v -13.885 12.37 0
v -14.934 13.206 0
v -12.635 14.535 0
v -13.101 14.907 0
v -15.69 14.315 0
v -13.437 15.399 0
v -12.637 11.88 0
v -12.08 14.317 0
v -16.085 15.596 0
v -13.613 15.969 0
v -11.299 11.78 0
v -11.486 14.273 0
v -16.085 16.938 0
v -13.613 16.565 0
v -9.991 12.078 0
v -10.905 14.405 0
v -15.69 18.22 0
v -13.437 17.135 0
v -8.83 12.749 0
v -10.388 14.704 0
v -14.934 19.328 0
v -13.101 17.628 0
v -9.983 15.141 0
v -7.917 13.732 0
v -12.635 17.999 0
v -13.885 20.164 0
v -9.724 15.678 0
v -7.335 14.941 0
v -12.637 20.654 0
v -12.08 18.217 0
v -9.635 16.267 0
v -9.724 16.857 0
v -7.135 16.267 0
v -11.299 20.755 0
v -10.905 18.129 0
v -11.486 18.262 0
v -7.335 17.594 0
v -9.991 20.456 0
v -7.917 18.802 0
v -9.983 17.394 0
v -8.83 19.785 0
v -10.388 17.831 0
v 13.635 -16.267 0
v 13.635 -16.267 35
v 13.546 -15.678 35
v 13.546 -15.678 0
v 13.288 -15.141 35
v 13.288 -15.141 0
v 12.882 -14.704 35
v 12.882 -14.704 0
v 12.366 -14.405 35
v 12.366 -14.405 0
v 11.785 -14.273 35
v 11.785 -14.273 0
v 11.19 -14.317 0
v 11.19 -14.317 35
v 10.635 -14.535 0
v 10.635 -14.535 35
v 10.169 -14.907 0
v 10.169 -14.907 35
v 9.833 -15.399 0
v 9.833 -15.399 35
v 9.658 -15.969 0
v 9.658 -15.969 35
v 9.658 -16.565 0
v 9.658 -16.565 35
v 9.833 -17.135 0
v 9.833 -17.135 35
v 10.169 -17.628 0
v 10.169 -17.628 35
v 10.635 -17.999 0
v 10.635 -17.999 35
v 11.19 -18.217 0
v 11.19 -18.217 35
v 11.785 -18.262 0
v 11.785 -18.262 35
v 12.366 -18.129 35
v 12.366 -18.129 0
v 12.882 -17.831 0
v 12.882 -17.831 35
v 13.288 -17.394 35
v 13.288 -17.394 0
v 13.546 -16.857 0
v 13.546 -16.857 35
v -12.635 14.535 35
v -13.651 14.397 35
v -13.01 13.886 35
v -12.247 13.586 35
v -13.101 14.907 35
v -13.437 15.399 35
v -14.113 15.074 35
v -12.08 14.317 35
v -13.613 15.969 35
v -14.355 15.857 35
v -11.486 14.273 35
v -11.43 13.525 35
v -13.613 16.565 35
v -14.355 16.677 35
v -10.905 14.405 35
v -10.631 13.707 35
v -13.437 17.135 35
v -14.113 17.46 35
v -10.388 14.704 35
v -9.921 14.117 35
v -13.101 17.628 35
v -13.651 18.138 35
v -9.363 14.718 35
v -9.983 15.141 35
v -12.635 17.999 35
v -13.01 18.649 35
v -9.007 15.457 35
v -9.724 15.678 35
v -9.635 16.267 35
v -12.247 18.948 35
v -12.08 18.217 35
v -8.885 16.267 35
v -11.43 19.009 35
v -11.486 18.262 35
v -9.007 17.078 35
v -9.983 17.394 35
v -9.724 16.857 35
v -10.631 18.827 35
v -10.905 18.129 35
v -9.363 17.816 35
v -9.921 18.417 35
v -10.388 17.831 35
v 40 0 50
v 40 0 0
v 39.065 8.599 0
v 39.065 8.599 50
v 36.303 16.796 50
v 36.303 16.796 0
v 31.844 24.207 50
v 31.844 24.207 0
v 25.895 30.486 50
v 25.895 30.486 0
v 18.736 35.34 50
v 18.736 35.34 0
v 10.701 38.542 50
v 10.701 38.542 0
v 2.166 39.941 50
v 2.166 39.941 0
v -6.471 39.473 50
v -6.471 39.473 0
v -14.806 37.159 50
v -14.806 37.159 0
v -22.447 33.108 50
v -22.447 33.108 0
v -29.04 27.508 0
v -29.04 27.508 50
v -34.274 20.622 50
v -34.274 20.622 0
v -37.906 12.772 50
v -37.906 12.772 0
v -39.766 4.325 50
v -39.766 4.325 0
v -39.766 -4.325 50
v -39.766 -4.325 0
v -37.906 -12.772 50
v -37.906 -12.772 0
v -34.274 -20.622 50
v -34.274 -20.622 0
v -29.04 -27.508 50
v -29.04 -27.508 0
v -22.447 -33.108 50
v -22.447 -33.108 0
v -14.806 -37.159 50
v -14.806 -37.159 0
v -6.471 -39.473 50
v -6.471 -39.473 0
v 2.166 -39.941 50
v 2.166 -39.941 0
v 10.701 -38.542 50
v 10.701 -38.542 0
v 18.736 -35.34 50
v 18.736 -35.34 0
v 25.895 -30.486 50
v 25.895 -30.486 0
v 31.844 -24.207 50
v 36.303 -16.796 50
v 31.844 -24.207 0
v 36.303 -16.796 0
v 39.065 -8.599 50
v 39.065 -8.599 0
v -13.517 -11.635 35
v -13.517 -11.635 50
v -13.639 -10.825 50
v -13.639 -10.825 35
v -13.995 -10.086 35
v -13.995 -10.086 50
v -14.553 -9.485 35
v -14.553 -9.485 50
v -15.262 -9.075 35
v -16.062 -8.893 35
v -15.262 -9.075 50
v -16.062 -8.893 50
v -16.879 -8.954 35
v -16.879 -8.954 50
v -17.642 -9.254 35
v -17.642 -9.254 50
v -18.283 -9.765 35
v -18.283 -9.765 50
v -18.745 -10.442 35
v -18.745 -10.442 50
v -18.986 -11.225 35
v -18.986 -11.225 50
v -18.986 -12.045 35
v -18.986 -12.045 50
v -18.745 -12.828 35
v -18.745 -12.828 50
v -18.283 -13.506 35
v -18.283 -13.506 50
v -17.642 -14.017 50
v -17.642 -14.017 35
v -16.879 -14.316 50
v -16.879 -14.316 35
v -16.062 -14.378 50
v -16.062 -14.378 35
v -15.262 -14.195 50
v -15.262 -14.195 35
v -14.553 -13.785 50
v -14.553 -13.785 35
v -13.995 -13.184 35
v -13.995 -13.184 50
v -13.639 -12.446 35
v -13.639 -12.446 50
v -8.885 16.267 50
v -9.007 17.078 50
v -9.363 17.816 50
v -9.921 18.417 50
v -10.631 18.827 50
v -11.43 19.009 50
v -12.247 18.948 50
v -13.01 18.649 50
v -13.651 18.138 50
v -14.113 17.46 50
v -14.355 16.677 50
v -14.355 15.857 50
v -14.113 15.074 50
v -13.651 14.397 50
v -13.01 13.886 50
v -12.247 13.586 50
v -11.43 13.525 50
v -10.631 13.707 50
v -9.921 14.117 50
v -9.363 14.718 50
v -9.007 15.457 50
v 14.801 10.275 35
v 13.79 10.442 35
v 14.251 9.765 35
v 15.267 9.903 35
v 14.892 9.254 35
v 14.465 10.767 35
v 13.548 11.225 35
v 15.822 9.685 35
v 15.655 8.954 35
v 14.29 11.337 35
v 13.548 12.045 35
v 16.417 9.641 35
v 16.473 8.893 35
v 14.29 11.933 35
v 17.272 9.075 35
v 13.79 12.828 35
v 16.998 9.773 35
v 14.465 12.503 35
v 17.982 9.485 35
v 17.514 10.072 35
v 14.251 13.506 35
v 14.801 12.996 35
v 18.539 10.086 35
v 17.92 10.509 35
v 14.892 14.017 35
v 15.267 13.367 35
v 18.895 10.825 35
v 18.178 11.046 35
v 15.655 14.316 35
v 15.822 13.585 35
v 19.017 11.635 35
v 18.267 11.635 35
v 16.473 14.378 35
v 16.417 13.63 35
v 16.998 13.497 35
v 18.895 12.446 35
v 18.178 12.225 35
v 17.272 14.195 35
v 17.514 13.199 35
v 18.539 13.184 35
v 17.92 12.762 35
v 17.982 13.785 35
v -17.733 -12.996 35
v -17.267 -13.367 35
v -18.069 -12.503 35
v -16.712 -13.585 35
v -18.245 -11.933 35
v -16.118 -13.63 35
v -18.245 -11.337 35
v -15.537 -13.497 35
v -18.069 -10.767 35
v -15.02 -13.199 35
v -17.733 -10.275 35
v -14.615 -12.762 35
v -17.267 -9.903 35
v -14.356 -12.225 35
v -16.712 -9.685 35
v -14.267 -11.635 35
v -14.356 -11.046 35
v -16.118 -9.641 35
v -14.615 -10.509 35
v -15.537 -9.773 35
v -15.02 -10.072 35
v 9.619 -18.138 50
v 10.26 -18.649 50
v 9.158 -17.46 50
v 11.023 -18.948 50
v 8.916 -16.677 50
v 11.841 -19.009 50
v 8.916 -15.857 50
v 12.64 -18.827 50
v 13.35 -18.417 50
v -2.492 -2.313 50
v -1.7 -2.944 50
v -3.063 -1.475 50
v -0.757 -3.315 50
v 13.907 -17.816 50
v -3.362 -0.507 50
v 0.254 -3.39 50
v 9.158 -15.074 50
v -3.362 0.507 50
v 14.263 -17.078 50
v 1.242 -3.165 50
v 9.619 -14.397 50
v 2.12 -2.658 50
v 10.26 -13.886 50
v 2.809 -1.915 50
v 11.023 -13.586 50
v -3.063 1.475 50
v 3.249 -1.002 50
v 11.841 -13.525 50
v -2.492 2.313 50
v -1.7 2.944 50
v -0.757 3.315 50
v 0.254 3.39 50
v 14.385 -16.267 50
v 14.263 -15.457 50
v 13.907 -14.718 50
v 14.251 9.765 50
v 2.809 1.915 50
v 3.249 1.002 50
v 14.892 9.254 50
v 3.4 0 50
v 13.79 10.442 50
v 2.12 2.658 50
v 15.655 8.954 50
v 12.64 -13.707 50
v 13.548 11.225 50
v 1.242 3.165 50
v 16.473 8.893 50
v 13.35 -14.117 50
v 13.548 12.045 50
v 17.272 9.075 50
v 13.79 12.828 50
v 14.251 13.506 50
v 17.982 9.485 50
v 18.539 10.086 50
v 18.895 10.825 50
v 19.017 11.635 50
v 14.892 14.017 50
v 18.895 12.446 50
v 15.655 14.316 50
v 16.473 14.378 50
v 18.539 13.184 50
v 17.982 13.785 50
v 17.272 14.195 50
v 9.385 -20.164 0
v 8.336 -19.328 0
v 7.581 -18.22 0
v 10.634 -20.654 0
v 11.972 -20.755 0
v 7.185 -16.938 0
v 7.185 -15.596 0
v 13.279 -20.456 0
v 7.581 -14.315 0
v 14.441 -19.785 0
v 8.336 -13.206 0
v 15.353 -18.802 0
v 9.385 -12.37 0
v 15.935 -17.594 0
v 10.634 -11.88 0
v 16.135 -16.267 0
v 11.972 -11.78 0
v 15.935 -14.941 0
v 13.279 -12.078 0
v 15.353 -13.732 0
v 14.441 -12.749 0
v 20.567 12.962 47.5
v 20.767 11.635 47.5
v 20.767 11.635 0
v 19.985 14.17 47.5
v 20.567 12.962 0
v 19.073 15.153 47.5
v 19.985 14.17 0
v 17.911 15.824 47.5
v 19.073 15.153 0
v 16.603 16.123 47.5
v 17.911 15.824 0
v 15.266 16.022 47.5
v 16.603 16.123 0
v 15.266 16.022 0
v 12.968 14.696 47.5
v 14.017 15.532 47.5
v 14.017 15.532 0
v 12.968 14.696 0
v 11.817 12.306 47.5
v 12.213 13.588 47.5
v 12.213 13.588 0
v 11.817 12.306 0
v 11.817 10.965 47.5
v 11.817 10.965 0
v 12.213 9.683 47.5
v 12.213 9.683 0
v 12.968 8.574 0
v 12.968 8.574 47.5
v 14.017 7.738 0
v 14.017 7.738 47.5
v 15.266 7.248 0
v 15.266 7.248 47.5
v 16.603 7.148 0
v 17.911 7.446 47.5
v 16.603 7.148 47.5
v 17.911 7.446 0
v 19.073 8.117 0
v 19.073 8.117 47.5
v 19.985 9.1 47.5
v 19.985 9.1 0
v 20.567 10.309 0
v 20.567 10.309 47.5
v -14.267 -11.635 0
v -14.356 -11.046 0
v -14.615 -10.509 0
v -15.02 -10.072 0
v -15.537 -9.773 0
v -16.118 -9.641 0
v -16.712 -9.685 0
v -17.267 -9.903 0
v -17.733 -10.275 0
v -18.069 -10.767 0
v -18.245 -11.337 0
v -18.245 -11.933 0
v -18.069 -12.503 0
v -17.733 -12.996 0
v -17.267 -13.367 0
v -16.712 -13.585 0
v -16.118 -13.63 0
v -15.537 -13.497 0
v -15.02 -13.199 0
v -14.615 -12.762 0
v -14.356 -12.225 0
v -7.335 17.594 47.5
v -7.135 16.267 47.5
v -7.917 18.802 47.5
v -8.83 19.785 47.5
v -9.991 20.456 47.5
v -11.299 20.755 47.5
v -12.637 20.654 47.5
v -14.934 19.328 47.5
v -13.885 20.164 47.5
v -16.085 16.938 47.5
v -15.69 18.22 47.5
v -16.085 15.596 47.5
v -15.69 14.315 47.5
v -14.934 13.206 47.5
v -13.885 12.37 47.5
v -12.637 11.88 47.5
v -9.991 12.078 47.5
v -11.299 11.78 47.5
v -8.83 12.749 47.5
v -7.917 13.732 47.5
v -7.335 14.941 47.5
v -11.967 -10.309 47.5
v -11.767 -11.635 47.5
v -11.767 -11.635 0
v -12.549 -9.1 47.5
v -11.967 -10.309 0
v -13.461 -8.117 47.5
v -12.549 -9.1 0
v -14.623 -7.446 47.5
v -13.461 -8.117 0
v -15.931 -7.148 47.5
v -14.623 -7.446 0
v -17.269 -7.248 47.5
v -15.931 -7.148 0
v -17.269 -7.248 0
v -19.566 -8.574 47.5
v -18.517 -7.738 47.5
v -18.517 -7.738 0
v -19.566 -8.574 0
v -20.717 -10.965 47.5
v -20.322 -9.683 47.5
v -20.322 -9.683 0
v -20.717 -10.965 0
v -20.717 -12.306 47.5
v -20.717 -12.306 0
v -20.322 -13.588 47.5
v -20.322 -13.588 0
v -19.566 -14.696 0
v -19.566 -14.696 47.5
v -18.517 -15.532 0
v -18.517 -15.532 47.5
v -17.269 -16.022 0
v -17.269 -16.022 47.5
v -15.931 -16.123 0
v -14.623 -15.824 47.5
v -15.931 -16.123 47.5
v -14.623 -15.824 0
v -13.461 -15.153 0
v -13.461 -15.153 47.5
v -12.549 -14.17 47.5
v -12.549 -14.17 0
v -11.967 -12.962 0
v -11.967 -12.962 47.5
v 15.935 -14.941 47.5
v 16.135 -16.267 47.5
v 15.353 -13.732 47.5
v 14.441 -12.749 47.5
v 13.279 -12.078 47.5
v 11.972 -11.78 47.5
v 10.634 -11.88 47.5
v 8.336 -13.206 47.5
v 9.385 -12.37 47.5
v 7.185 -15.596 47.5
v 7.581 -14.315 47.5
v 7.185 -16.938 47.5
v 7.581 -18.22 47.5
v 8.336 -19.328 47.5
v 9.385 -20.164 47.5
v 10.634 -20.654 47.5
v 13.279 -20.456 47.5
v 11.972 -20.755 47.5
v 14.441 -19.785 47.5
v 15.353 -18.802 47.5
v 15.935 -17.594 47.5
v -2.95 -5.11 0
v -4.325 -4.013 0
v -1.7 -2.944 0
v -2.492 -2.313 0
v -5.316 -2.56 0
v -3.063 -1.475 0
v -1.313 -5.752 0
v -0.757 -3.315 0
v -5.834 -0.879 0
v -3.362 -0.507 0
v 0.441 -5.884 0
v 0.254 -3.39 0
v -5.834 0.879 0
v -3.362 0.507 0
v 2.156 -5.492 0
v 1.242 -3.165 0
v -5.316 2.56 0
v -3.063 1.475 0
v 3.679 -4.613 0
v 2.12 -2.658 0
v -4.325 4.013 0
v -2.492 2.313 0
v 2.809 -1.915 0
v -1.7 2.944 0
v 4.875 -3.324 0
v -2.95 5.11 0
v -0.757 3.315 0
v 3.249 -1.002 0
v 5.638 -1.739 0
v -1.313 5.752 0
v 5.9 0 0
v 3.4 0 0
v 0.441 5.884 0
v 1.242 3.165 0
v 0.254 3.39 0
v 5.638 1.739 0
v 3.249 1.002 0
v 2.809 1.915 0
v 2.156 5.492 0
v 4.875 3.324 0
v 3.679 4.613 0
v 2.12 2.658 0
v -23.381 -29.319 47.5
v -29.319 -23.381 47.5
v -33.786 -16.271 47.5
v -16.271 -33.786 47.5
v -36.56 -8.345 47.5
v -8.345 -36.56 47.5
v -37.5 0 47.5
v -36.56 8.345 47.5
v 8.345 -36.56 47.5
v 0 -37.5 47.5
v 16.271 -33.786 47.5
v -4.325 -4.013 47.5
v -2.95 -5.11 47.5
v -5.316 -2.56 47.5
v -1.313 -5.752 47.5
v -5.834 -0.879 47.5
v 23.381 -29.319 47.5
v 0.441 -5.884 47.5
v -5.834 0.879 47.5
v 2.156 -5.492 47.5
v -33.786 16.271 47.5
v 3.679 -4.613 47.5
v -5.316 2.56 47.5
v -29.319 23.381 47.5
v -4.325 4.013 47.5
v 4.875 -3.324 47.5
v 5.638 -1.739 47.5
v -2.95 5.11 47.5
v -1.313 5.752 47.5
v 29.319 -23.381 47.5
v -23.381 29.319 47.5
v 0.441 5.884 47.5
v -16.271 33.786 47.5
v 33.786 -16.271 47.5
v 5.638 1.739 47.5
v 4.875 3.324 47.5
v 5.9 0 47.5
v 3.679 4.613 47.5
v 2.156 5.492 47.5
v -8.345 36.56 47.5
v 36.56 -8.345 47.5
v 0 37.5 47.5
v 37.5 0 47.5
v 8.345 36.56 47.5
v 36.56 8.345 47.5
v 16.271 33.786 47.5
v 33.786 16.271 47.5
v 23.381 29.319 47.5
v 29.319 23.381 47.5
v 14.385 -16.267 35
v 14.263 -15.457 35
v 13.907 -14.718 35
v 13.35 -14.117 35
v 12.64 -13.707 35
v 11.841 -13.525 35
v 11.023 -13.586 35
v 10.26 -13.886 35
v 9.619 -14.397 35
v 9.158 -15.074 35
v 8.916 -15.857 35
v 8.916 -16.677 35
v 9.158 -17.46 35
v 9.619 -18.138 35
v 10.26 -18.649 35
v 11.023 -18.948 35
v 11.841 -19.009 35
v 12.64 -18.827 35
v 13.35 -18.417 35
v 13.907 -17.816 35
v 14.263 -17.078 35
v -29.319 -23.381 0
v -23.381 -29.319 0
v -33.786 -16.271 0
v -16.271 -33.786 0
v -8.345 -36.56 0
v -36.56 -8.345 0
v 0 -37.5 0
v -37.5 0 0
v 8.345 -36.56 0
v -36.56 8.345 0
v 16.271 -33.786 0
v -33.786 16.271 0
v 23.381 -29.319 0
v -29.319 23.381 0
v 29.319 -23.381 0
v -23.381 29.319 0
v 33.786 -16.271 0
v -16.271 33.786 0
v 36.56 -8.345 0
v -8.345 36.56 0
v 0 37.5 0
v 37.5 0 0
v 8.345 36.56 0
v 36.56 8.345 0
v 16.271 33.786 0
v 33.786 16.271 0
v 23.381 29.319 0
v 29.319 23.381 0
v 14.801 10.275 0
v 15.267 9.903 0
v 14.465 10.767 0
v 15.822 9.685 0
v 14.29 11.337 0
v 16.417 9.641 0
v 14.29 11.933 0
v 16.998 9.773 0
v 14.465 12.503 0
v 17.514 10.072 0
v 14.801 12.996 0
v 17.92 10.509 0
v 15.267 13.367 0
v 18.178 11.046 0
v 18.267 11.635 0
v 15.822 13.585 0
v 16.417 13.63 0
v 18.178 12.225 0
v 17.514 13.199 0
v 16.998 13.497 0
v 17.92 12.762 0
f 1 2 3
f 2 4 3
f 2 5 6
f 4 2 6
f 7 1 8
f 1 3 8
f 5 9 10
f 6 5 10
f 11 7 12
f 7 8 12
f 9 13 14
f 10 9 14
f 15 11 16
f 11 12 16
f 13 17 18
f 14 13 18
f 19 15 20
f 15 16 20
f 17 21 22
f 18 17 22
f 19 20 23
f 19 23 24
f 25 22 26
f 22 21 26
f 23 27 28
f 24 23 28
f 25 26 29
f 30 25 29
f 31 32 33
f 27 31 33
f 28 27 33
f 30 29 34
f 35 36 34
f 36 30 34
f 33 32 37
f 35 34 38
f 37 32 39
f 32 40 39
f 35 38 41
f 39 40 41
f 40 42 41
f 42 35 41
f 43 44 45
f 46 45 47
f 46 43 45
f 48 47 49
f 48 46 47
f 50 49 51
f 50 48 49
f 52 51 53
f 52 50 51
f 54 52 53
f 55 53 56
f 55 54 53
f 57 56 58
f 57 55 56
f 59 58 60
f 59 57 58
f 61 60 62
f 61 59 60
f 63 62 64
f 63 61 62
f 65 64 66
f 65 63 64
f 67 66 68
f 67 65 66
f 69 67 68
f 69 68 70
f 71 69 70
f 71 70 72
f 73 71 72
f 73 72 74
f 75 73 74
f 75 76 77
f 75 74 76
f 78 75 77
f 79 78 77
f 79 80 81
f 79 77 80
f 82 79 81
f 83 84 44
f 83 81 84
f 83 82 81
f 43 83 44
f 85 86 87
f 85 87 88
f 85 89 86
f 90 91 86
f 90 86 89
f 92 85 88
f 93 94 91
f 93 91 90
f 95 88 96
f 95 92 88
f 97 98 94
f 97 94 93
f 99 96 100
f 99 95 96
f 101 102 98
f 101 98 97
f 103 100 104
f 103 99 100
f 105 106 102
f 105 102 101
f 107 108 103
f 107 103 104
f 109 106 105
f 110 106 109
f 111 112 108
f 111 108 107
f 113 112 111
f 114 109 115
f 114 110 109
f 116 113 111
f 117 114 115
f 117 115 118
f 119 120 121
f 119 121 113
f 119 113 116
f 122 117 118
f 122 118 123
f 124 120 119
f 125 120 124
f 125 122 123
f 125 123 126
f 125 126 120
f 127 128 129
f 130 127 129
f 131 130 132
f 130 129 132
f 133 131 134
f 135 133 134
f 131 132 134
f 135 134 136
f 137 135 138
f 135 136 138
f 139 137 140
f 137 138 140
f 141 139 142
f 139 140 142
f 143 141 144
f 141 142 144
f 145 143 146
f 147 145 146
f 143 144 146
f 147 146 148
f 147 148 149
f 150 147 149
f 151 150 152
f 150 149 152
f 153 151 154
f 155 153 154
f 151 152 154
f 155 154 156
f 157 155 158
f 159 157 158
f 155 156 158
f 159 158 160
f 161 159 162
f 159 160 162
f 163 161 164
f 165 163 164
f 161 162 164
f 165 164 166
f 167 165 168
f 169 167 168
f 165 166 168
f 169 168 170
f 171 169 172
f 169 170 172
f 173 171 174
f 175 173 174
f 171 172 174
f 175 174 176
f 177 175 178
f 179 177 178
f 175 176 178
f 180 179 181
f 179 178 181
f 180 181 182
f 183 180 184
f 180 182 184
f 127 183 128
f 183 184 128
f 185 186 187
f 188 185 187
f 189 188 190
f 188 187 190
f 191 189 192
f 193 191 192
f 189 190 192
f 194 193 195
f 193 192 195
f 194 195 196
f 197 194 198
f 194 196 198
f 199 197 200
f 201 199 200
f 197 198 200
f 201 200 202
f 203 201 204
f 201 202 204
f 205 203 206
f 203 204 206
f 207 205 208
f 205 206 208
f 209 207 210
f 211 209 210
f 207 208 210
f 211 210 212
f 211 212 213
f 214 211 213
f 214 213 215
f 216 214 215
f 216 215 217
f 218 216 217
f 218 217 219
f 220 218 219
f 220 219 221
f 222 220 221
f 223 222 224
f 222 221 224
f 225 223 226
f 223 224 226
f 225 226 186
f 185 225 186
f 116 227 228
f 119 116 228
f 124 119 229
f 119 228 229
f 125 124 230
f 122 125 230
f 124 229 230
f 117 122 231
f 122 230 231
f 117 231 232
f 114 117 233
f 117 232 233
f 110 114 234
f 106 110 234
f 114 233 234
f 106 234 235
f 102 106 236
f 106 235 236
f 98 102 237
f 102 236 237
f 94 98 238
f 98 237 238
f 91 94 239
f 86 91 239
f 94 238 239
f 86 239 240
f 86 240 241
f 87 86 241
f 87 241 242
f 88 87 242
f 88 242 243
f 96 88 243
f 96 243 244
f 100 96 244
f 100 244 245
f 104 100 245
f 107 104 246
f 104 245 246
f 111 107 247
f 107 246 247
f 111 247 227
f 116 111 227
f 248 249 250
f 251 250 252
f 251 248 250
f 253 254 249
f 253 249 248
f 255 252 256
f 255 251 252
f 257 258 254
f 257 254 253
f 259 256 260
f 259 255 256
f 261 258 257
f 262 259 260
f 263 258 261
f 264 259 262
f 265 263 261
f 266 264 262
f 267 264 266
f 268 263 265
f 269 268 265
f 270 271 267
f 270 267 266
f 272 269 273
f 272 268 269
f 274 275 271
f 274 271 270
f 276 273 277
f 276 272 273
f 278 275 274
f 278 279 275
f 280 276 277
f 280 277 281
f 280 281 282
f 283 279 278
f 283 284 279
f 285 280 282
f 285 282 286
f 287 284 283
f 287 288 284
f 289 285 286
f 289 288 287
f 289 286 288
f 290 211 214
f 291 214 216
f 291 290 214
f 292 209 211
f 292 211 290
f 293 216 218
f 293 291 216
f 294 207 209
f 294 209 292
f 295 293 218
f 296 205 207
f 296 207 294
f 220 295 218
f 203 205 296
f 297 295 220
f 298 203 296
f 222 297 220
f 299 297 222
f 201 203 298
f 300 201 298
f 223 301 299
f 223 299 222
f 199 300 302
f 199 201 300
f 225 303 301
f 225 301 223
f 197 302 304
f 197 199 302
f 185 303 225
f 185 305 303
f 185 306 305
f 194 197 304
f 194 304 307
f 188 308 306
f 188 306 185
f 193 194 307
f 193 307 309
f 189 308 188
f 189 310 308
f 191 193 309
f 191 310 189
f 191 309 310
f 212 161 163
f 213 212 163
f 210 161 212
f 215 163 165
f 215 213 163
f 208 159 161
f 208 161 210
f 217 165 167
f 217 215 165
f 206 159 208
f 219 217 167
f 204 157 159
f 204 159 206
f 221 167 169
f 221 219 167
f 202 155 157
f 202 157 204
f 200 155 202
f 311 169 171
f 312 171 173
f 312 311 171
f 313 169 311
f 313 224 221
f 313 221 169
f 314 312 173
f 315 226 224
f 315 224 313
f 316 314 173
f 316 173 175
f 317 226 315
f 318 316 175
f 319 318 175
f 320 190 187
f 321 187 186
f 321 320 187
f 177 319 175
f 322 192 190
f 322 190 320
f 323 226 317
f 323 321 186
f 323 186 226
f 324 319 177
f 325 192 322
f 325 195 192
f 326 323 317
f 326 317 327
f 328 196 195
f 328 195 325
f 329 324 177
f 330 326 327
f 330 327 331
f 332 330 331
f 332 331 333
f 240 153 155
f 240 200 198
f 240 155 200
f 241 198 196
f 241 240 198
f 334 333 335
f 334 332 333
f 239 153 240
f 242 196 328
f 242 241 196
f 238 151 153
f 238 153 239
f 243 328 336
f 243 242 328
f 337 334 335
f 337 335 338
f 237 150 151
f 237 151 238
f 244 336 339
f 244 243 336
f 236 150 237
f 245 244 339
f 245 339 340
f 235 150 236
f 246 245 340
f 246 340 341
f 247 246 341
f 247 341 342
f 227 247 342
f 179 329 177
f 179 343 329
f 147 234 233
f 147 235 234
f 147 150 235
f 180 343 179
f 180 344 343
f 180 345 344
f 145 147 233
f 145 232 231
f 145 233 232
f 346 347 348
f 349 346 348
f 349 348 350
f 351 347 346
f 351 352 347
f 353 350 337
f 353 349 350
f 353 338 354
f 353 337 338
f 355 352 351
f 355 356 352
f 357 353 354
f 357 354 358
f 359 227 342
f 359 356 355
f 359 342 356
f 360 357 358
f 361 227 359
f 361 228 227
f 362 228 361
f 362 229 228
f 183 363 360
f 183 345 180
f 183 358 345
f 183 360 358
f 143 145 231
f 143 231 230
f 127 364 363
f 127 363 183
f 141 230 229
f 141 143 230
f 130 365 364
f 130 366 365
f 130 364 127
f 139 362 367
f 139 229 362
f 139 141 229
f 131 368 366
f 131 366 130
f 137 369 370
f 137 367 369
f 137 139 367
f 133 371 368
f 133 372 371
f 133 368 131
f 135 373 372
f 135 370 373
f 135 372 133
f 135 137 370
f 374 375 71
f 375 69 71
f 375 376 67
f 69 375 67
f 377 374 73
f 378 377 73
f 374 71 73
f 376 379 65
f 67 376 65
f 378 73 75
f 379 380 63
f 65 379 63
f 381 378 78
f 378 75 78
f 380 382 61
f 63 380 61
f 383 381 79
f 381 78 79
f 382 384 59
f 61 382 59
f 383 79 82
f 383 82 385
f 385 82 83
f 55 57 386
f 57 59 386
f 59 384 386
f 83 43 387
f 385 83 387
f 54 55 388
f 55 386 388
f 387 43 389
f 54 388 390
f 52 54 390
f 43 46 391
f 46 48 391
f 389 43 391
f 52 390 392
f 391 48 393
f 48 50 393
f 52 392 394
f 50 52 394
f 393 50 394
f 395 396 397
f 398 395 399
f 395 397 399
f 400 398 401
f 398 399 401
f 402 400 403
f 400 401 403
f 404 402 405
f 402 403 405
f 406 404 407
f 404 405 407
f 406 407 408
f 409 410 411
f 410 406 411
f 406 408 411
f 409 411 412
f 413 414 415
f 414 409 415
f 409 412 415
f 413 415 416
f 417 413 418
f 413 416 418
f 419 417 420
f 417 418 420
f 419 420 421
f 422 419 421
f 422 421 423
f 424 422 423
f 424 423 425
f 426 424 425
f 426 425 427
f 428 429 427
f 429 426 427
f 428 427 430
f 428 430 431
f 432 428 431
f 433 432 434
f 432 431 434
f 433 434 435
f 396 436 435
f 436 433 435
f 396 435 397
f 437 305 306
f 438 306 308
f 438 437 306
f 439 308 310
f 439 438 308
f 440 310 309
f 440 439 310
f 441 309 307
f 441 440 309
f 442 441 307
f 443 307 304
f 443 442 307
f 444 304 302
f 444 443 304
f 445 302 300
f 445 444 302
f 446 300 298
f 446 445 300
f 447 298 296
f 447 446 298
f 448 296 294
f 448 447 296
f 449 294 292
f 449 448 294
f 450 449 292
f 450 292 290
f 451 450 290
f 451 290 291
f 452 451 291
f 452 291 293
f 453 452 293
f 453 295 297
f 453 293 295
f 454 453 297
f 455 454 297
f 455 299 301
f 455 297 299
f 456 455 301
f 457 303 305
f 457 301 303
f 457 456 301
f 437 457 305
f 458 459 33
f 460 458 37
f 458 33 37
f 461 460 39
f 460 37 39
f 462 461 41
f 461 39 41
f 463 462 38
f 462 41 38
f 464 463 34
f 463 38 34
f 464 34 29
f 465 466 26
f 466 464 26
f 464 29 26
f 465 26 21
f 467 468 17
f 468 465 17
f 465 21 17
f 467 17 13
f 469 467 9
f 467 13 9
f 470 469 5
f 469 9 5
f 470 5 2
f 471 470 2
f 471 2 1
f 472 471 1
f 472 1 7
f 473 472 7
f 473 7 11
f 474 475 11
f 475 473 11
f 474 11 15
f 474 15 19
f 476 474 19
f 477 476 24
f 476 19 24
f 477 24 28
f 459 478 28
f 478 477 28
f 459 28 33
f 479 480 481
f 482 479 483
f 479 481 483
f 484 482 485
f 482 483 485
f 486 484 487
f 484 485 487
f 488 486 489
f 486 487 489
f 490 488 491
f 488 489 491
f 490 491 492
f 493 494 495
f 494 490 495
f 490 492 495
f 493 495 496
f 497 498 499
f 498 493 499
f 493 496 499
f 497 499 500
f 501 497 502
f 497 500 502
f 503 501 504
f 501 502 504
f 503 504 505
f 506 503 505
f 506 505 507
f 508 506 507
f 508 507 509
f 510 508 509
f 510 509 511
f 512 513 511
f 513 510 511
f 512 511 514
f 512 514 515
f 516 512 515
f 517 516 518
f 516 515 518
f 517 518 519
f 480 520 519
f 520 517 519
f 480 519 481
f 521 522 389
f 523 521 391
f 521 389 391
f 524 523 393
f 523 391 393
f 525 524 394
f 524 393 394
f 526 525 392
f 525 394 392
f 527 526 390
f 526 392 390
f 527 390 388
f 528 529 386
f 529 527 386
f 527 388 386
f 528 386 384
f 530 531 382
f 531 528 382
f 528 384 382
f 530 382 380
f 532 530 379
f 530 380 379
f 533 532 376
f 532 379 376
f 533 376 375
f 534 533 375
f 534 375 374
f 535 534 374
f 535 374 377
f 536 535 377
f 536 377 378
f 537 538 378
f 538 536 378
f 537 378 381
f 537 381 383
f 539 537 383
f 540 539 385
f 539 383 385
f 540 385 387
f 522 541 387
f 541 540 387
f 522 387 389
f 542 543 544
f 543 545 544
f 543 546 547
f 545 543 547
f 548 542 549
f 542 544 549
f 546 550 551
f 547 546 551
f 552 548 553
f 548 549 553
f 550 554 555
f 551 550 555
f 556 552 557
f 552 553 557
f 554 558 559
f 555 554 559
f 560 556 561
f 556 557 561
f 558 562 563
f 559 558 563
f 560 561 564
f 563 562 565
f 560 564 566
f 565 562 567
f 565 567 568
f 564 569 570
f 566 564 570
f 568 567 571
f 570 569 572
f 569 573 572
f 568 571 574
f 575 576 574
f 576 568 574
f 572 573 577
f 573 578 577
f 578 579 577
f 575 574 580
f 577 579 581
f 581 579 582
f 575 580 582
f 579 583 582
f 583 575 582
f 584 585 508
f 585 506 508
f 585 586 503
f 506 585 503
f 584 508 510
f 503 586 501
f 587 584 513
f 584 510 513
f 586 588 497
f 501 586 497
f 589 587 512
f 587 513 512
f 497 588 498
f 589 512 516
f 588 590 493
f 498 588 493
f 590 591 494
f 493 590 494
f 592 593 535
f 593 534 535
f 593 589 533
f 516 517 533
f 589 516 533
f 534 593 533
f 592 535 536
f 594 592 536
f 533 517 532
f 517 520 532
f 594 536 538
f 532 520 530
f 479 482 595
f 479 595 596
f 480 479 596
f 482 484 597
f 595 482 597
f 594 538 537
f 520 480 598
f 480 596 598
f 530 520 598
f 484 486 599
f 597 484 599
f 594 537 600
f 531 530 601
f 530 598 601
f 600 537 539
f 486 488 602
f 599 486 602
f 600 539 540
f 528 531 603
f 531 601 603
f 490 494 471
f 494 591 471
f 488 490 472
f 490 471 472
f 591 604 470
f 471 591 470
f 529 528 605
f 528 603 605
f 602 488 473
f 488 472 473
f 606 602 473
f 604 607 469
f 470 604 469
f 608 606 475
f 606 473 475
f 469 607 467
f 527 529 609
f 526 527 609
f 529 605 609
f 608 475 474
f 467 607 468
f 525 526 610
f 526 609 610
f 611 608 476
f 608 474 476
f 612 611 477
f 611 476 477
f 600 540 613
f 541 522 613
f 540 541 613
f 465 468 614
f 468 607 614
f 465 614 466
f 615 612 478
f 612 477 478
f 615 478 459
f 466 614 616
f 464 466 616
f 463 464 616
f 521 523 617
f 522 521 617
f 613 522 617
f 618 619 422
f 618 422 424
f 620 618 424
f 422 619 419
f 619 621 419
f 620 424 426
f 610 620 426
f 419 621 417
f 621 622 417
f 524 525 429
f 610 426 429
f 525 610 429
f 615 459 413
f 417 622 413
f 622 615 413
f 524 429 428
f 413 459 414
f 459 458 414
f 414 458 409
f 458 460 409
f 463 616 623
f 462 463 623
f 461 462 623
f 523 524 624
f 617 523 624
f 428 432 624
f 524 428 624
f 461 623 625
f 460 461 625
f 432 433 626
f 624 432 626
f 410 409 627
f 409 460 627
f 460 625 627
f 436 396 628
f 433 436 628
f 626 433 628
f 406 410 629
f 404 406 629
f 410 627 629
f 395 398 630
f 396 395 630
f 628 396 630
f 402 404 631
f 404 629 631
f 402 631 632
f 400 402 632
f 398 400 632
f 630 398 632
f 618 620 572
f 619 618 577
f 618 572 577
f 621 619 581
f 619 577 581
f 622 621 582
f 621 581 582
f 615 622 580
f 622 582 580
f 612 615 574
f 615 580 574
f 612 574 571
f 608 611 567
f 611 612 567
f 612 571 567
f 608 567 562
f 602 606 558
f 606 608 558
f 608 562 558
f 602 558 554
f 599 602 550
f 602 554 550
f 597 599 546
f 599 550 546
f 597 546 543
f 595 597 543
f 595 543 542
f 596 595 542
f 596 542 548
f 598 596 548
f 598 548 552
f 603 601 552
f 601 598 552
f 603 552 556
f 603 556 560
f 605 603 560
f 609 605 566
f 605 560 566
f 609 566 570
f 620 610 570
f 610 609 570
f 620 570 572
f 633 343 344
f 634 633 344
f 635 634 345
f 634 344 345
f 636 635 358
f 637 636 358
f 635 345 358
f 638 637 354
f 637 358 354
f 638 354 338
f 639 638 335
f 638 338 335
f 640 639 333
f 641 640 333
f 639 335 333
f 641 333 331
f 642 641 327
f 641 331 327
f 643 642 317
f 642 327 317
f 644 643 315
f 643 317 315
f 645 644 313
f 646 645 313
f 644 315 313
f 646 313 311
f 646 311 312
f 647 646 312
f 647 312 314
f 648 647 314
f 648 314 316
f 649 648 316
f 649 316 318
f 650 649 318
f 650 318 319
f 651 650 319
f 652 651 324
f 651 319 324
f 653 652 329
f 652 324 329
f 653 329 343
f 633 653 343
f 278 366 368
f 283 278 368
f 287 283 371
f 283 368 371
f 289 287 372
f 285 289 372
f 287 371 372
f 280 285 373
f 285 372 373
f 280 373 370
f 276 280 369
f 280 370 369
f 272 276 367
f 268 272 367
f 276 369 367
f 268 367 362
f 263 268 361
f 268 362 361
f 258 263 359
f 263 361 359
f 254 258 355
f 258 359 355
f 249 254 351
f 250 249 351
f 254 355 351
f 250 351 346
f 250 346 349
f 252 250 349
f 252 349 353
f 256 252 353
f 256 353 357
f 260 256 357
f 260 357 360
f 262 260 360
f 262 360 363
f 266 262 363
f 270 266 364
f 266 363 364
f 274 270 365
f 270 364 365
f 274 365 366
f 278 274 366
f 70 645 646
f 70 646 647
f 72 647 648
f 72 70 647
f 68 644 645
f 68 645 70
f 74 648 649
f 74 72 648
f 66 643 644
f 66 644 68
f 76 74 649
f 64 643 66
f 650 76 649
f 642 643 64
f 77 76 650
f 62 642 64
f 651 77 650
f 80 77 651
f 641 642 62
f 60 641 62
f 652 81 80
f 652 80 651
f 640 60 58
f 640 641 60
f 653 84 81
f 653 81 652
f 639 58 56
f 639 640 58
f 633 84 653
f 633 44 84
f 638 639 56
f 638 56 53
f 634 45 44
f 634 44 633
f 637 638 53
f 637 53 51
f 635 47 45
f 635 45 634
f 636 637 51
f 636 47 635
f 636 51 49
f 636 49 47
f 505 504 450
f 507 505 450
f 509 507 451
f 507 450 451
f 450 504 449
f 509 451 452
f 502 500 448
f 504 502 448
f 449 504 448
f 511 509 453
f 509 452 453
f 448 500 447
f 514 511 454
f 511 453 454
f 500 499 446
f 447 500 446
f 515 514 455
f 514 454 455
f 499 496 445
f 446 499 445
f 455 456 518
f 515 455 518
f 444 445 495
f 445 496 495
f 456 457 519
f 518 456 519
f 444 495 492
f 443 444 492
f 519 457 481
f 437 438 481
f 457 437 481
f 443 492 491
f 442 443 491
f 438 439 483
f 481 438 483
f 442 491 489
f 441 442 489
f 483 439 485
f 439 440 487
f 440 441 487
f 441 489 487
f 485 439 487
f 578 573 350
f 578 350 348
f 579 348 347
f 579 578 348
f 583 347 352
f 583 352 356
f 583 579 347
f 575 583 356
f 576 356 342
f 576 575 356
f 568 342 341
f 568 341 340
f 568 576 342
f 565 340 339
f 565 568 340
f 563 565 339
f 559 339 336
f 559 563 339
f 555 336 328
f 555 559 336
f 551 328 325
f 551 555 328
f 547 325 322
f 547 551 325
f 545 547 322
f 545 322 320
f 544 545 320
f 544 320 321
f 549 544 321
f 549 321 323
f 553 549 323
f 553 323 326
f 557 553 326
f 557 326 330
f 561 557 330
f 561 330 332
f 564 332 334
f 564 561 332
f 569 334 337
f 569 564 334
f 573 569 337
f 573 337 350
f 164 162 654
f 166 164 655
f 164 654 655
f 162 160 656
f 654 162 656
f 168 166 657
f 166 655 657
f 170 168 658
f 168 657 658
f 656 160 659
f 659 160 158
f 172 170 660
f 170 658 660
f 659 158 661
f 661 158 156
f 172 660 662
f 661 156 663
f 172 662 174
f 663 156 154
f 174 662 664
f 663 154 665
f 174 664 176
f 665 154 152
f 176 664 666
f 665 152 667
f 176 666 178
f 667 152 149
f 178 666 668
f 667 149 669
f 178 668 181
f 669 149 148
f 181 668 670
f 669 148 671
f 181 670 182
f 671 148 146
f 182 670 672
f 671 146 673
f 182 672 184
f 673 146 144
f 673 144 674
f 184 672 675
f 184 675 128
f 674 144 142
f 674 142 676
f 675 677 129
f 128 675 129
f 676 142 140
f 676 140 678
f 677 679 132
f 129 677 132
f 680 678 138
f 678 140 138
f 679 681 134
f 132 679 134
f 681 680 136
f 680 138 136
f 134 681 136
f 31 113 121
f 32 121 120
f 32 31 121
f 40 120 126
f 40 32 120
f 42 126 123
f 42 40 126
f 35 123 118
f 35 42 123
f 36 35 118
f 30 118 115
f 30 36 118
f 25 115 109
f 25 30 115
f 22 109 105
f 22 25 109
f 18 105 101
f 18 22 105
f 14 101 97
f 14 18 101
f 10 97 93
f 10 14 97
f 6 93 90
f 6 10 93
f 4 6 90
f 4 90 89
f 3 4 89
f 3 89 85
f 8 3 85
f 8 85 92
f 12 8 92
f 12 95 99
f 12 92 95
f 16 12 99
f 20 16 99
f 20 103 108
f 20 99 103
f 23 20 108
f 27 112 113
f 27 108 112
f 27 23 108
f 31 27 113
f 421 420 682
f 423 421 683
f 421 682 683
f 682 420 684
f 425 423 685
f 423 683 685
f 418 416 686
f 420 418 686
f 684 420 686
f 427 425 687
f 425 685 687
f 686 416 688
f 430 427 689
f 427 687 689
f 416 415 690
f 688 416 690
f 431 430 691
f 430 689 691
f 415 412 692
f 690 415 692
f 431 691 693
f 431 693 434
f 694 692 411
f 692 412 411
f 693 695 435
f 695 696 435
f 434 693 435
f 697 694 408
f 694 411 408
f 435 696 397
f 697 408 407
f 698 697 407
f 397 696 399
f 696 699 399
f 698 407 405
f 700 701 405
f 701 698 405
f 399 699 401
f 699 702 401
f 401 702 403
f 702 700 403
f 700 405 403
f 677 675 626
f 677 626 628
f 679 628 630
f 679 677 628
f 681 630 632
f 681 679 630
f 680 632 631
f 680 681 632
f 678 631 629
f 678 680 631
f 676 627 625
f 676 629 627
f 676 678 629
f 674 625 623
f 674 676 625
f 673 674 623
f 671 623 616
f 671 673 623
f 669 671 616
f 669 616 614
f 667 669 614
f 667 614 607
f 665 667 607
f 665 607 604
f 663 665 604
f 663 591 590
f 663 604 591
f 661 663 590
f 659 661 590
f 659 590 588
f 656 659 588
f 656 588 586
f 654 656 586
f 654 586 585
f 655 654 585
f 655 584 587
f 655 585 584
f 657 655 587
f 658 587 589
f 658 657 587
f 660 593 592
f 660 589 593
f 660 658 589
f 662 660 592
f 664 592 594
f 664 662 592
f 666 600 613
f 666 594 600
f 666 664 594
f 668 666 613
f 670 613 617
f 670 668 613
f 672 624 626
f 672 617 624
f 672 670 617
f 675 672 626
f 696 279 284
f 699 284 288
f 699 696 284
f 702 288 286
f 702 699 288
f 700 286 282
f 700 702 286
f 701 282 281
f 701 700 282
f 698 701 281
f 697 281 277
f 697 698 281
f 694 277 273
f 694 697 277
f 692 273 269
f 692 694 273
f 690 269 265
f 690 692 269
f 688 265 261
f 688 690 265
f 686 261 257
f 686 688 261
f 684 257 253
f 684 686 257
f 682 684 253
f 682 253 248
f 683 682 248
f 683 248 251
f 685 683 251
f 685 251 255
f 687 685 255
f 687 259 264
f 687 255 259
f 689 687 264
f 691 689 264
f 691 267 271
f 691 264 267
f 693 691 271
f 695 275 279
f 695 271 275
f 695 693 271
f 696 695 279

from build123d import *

# Parameters (mm, degrees)
F0_R      = 40
F0_R_2    = 2
F0_R_3    = 3.4
F1_DEPTH  = 50
F3_R      = 2.75
F4_DEPTH  = 10
F5_T      = -2.5
F4_FACE_R = 2.75
F6_DEPTH  = 15


with BuildPart() as f1:
    # F0 (on Top) → F1 (new body)
    with BuildSketch(Plane.XY):
        Circle(F0_R)
        with Locations((-16.2671870079, -11.6352321356)):
            Circle(F0_R_2, mode=Mode.SUBTRACT)
        with Locations((11.6352321356, -16.2671870079)):
            Circle(F0_R_2, mode=Mode.SUBTRACT)
        with Locations((-11.6352321356, 16.2671870079)):
            Circle(F0_R_2, mode=Mode.SUBTRACT)
        Circle(F0_R_3, mode=Mode.SUBTRACT)
        with Locations((16.2671870079, 11.6352321356)):
            Circle(F0_R_2, mode=Mode.SUBTRACT)
    extrude(amount=F1_DEPTH)

    # F5
    f5_openings = [f1.faces().sort_by_distance(p)[0] for p in [
        (-38.868629, 0, 0),
    ]]
    offset(amount=F5_T, openings=f5_openings)


with BuildPart() as f4:
    # F3 (on face) → F4 (new body)
    with BuildSketch(Plane.XY.offset(50)):
        with Locations((-11.6352321356, 16.2671870079)):
            Circle(F3_R)
    extrude(amount=-F4_DEPTH)


with BuildPart() as f4b:
    # F3 (on face) → F4, piece 2 (new body)
    with BuildSketch(Plane.XY.offset(50)):
        with Locations((16.2671870079, 11.6352321356)):
            Circle(F3_R)
    extrude(amount=-F4_DEPTH)


with BuildPart() as f4c:
    # F3 (on face) → F4, piece 3 (new body)
    with BuildSketch(Plane.XY.offset(50)):
        with Locations((11.6352321356, -16.2671870079)):
            Circle(F3_R)
    extrude(amount=-F4_DEPTH)


with BuildPart() as f4d:
    # F3 (on face) → F4, piece 4 (new body)
    with BuildSketch(Plane.XY.offset(50)):
        with Locations((-16.2671870079, -11.6352321356)):
            Circle(F3_R)
    extrude(amount=-F4_DEPTH)


with BuildPart() as f6_tool:
    # F4_face (on face) → F6 (new body)
    with BuildSketch(Plane(origin=(-11.6352321356, 16.2671870079, 50), x_dir=(1, 0, 0), z_dir=(0, 0, 1))):
        Circle(F4_FACE_R)
        with Locations((23.2704642711, -32.5343740159)):
            Circle(F4_FACE_R)
        with Locations((27.9024191435, -4.6319548724)):
            Circle(F4_FACE_R)
        with Locations((-4.6319548724, -27.9024191435)):
            Circle(F4_FACE_R)
    extrude(amount=-F6_DEPTH)


with BuildPart() as f1_1:
    add(f1.part)

    # F6: cut by f6_tool
    add(f6_tool.part, mode=Mode.SUBTRACT)


with BuildPart() as f4_1:
    add(f4.part)

    # F6: cut by f6_tool
    add(f6_tool.part, mode=Mode.SUBTRACT)


with BuildPart() as f4b_1:
    add(f4b.part)

    # F6: cut by f6_tool
    add(f6_tool.part, mode=Mode.SUBTRACT)


with BuildPart() as f4c_1:
    add(f4c.part)

    # F6: cut by f6_tool
    add(f6_tool.part, mode=Mode.SUBTRACT)


with BuildPart() as f4d_1:
    add(f4d.part)

    # F6: cut by f6_tool
    add(f6_tool.part, mode=Mode.SUBTRACT)


solid = f1_1.part
